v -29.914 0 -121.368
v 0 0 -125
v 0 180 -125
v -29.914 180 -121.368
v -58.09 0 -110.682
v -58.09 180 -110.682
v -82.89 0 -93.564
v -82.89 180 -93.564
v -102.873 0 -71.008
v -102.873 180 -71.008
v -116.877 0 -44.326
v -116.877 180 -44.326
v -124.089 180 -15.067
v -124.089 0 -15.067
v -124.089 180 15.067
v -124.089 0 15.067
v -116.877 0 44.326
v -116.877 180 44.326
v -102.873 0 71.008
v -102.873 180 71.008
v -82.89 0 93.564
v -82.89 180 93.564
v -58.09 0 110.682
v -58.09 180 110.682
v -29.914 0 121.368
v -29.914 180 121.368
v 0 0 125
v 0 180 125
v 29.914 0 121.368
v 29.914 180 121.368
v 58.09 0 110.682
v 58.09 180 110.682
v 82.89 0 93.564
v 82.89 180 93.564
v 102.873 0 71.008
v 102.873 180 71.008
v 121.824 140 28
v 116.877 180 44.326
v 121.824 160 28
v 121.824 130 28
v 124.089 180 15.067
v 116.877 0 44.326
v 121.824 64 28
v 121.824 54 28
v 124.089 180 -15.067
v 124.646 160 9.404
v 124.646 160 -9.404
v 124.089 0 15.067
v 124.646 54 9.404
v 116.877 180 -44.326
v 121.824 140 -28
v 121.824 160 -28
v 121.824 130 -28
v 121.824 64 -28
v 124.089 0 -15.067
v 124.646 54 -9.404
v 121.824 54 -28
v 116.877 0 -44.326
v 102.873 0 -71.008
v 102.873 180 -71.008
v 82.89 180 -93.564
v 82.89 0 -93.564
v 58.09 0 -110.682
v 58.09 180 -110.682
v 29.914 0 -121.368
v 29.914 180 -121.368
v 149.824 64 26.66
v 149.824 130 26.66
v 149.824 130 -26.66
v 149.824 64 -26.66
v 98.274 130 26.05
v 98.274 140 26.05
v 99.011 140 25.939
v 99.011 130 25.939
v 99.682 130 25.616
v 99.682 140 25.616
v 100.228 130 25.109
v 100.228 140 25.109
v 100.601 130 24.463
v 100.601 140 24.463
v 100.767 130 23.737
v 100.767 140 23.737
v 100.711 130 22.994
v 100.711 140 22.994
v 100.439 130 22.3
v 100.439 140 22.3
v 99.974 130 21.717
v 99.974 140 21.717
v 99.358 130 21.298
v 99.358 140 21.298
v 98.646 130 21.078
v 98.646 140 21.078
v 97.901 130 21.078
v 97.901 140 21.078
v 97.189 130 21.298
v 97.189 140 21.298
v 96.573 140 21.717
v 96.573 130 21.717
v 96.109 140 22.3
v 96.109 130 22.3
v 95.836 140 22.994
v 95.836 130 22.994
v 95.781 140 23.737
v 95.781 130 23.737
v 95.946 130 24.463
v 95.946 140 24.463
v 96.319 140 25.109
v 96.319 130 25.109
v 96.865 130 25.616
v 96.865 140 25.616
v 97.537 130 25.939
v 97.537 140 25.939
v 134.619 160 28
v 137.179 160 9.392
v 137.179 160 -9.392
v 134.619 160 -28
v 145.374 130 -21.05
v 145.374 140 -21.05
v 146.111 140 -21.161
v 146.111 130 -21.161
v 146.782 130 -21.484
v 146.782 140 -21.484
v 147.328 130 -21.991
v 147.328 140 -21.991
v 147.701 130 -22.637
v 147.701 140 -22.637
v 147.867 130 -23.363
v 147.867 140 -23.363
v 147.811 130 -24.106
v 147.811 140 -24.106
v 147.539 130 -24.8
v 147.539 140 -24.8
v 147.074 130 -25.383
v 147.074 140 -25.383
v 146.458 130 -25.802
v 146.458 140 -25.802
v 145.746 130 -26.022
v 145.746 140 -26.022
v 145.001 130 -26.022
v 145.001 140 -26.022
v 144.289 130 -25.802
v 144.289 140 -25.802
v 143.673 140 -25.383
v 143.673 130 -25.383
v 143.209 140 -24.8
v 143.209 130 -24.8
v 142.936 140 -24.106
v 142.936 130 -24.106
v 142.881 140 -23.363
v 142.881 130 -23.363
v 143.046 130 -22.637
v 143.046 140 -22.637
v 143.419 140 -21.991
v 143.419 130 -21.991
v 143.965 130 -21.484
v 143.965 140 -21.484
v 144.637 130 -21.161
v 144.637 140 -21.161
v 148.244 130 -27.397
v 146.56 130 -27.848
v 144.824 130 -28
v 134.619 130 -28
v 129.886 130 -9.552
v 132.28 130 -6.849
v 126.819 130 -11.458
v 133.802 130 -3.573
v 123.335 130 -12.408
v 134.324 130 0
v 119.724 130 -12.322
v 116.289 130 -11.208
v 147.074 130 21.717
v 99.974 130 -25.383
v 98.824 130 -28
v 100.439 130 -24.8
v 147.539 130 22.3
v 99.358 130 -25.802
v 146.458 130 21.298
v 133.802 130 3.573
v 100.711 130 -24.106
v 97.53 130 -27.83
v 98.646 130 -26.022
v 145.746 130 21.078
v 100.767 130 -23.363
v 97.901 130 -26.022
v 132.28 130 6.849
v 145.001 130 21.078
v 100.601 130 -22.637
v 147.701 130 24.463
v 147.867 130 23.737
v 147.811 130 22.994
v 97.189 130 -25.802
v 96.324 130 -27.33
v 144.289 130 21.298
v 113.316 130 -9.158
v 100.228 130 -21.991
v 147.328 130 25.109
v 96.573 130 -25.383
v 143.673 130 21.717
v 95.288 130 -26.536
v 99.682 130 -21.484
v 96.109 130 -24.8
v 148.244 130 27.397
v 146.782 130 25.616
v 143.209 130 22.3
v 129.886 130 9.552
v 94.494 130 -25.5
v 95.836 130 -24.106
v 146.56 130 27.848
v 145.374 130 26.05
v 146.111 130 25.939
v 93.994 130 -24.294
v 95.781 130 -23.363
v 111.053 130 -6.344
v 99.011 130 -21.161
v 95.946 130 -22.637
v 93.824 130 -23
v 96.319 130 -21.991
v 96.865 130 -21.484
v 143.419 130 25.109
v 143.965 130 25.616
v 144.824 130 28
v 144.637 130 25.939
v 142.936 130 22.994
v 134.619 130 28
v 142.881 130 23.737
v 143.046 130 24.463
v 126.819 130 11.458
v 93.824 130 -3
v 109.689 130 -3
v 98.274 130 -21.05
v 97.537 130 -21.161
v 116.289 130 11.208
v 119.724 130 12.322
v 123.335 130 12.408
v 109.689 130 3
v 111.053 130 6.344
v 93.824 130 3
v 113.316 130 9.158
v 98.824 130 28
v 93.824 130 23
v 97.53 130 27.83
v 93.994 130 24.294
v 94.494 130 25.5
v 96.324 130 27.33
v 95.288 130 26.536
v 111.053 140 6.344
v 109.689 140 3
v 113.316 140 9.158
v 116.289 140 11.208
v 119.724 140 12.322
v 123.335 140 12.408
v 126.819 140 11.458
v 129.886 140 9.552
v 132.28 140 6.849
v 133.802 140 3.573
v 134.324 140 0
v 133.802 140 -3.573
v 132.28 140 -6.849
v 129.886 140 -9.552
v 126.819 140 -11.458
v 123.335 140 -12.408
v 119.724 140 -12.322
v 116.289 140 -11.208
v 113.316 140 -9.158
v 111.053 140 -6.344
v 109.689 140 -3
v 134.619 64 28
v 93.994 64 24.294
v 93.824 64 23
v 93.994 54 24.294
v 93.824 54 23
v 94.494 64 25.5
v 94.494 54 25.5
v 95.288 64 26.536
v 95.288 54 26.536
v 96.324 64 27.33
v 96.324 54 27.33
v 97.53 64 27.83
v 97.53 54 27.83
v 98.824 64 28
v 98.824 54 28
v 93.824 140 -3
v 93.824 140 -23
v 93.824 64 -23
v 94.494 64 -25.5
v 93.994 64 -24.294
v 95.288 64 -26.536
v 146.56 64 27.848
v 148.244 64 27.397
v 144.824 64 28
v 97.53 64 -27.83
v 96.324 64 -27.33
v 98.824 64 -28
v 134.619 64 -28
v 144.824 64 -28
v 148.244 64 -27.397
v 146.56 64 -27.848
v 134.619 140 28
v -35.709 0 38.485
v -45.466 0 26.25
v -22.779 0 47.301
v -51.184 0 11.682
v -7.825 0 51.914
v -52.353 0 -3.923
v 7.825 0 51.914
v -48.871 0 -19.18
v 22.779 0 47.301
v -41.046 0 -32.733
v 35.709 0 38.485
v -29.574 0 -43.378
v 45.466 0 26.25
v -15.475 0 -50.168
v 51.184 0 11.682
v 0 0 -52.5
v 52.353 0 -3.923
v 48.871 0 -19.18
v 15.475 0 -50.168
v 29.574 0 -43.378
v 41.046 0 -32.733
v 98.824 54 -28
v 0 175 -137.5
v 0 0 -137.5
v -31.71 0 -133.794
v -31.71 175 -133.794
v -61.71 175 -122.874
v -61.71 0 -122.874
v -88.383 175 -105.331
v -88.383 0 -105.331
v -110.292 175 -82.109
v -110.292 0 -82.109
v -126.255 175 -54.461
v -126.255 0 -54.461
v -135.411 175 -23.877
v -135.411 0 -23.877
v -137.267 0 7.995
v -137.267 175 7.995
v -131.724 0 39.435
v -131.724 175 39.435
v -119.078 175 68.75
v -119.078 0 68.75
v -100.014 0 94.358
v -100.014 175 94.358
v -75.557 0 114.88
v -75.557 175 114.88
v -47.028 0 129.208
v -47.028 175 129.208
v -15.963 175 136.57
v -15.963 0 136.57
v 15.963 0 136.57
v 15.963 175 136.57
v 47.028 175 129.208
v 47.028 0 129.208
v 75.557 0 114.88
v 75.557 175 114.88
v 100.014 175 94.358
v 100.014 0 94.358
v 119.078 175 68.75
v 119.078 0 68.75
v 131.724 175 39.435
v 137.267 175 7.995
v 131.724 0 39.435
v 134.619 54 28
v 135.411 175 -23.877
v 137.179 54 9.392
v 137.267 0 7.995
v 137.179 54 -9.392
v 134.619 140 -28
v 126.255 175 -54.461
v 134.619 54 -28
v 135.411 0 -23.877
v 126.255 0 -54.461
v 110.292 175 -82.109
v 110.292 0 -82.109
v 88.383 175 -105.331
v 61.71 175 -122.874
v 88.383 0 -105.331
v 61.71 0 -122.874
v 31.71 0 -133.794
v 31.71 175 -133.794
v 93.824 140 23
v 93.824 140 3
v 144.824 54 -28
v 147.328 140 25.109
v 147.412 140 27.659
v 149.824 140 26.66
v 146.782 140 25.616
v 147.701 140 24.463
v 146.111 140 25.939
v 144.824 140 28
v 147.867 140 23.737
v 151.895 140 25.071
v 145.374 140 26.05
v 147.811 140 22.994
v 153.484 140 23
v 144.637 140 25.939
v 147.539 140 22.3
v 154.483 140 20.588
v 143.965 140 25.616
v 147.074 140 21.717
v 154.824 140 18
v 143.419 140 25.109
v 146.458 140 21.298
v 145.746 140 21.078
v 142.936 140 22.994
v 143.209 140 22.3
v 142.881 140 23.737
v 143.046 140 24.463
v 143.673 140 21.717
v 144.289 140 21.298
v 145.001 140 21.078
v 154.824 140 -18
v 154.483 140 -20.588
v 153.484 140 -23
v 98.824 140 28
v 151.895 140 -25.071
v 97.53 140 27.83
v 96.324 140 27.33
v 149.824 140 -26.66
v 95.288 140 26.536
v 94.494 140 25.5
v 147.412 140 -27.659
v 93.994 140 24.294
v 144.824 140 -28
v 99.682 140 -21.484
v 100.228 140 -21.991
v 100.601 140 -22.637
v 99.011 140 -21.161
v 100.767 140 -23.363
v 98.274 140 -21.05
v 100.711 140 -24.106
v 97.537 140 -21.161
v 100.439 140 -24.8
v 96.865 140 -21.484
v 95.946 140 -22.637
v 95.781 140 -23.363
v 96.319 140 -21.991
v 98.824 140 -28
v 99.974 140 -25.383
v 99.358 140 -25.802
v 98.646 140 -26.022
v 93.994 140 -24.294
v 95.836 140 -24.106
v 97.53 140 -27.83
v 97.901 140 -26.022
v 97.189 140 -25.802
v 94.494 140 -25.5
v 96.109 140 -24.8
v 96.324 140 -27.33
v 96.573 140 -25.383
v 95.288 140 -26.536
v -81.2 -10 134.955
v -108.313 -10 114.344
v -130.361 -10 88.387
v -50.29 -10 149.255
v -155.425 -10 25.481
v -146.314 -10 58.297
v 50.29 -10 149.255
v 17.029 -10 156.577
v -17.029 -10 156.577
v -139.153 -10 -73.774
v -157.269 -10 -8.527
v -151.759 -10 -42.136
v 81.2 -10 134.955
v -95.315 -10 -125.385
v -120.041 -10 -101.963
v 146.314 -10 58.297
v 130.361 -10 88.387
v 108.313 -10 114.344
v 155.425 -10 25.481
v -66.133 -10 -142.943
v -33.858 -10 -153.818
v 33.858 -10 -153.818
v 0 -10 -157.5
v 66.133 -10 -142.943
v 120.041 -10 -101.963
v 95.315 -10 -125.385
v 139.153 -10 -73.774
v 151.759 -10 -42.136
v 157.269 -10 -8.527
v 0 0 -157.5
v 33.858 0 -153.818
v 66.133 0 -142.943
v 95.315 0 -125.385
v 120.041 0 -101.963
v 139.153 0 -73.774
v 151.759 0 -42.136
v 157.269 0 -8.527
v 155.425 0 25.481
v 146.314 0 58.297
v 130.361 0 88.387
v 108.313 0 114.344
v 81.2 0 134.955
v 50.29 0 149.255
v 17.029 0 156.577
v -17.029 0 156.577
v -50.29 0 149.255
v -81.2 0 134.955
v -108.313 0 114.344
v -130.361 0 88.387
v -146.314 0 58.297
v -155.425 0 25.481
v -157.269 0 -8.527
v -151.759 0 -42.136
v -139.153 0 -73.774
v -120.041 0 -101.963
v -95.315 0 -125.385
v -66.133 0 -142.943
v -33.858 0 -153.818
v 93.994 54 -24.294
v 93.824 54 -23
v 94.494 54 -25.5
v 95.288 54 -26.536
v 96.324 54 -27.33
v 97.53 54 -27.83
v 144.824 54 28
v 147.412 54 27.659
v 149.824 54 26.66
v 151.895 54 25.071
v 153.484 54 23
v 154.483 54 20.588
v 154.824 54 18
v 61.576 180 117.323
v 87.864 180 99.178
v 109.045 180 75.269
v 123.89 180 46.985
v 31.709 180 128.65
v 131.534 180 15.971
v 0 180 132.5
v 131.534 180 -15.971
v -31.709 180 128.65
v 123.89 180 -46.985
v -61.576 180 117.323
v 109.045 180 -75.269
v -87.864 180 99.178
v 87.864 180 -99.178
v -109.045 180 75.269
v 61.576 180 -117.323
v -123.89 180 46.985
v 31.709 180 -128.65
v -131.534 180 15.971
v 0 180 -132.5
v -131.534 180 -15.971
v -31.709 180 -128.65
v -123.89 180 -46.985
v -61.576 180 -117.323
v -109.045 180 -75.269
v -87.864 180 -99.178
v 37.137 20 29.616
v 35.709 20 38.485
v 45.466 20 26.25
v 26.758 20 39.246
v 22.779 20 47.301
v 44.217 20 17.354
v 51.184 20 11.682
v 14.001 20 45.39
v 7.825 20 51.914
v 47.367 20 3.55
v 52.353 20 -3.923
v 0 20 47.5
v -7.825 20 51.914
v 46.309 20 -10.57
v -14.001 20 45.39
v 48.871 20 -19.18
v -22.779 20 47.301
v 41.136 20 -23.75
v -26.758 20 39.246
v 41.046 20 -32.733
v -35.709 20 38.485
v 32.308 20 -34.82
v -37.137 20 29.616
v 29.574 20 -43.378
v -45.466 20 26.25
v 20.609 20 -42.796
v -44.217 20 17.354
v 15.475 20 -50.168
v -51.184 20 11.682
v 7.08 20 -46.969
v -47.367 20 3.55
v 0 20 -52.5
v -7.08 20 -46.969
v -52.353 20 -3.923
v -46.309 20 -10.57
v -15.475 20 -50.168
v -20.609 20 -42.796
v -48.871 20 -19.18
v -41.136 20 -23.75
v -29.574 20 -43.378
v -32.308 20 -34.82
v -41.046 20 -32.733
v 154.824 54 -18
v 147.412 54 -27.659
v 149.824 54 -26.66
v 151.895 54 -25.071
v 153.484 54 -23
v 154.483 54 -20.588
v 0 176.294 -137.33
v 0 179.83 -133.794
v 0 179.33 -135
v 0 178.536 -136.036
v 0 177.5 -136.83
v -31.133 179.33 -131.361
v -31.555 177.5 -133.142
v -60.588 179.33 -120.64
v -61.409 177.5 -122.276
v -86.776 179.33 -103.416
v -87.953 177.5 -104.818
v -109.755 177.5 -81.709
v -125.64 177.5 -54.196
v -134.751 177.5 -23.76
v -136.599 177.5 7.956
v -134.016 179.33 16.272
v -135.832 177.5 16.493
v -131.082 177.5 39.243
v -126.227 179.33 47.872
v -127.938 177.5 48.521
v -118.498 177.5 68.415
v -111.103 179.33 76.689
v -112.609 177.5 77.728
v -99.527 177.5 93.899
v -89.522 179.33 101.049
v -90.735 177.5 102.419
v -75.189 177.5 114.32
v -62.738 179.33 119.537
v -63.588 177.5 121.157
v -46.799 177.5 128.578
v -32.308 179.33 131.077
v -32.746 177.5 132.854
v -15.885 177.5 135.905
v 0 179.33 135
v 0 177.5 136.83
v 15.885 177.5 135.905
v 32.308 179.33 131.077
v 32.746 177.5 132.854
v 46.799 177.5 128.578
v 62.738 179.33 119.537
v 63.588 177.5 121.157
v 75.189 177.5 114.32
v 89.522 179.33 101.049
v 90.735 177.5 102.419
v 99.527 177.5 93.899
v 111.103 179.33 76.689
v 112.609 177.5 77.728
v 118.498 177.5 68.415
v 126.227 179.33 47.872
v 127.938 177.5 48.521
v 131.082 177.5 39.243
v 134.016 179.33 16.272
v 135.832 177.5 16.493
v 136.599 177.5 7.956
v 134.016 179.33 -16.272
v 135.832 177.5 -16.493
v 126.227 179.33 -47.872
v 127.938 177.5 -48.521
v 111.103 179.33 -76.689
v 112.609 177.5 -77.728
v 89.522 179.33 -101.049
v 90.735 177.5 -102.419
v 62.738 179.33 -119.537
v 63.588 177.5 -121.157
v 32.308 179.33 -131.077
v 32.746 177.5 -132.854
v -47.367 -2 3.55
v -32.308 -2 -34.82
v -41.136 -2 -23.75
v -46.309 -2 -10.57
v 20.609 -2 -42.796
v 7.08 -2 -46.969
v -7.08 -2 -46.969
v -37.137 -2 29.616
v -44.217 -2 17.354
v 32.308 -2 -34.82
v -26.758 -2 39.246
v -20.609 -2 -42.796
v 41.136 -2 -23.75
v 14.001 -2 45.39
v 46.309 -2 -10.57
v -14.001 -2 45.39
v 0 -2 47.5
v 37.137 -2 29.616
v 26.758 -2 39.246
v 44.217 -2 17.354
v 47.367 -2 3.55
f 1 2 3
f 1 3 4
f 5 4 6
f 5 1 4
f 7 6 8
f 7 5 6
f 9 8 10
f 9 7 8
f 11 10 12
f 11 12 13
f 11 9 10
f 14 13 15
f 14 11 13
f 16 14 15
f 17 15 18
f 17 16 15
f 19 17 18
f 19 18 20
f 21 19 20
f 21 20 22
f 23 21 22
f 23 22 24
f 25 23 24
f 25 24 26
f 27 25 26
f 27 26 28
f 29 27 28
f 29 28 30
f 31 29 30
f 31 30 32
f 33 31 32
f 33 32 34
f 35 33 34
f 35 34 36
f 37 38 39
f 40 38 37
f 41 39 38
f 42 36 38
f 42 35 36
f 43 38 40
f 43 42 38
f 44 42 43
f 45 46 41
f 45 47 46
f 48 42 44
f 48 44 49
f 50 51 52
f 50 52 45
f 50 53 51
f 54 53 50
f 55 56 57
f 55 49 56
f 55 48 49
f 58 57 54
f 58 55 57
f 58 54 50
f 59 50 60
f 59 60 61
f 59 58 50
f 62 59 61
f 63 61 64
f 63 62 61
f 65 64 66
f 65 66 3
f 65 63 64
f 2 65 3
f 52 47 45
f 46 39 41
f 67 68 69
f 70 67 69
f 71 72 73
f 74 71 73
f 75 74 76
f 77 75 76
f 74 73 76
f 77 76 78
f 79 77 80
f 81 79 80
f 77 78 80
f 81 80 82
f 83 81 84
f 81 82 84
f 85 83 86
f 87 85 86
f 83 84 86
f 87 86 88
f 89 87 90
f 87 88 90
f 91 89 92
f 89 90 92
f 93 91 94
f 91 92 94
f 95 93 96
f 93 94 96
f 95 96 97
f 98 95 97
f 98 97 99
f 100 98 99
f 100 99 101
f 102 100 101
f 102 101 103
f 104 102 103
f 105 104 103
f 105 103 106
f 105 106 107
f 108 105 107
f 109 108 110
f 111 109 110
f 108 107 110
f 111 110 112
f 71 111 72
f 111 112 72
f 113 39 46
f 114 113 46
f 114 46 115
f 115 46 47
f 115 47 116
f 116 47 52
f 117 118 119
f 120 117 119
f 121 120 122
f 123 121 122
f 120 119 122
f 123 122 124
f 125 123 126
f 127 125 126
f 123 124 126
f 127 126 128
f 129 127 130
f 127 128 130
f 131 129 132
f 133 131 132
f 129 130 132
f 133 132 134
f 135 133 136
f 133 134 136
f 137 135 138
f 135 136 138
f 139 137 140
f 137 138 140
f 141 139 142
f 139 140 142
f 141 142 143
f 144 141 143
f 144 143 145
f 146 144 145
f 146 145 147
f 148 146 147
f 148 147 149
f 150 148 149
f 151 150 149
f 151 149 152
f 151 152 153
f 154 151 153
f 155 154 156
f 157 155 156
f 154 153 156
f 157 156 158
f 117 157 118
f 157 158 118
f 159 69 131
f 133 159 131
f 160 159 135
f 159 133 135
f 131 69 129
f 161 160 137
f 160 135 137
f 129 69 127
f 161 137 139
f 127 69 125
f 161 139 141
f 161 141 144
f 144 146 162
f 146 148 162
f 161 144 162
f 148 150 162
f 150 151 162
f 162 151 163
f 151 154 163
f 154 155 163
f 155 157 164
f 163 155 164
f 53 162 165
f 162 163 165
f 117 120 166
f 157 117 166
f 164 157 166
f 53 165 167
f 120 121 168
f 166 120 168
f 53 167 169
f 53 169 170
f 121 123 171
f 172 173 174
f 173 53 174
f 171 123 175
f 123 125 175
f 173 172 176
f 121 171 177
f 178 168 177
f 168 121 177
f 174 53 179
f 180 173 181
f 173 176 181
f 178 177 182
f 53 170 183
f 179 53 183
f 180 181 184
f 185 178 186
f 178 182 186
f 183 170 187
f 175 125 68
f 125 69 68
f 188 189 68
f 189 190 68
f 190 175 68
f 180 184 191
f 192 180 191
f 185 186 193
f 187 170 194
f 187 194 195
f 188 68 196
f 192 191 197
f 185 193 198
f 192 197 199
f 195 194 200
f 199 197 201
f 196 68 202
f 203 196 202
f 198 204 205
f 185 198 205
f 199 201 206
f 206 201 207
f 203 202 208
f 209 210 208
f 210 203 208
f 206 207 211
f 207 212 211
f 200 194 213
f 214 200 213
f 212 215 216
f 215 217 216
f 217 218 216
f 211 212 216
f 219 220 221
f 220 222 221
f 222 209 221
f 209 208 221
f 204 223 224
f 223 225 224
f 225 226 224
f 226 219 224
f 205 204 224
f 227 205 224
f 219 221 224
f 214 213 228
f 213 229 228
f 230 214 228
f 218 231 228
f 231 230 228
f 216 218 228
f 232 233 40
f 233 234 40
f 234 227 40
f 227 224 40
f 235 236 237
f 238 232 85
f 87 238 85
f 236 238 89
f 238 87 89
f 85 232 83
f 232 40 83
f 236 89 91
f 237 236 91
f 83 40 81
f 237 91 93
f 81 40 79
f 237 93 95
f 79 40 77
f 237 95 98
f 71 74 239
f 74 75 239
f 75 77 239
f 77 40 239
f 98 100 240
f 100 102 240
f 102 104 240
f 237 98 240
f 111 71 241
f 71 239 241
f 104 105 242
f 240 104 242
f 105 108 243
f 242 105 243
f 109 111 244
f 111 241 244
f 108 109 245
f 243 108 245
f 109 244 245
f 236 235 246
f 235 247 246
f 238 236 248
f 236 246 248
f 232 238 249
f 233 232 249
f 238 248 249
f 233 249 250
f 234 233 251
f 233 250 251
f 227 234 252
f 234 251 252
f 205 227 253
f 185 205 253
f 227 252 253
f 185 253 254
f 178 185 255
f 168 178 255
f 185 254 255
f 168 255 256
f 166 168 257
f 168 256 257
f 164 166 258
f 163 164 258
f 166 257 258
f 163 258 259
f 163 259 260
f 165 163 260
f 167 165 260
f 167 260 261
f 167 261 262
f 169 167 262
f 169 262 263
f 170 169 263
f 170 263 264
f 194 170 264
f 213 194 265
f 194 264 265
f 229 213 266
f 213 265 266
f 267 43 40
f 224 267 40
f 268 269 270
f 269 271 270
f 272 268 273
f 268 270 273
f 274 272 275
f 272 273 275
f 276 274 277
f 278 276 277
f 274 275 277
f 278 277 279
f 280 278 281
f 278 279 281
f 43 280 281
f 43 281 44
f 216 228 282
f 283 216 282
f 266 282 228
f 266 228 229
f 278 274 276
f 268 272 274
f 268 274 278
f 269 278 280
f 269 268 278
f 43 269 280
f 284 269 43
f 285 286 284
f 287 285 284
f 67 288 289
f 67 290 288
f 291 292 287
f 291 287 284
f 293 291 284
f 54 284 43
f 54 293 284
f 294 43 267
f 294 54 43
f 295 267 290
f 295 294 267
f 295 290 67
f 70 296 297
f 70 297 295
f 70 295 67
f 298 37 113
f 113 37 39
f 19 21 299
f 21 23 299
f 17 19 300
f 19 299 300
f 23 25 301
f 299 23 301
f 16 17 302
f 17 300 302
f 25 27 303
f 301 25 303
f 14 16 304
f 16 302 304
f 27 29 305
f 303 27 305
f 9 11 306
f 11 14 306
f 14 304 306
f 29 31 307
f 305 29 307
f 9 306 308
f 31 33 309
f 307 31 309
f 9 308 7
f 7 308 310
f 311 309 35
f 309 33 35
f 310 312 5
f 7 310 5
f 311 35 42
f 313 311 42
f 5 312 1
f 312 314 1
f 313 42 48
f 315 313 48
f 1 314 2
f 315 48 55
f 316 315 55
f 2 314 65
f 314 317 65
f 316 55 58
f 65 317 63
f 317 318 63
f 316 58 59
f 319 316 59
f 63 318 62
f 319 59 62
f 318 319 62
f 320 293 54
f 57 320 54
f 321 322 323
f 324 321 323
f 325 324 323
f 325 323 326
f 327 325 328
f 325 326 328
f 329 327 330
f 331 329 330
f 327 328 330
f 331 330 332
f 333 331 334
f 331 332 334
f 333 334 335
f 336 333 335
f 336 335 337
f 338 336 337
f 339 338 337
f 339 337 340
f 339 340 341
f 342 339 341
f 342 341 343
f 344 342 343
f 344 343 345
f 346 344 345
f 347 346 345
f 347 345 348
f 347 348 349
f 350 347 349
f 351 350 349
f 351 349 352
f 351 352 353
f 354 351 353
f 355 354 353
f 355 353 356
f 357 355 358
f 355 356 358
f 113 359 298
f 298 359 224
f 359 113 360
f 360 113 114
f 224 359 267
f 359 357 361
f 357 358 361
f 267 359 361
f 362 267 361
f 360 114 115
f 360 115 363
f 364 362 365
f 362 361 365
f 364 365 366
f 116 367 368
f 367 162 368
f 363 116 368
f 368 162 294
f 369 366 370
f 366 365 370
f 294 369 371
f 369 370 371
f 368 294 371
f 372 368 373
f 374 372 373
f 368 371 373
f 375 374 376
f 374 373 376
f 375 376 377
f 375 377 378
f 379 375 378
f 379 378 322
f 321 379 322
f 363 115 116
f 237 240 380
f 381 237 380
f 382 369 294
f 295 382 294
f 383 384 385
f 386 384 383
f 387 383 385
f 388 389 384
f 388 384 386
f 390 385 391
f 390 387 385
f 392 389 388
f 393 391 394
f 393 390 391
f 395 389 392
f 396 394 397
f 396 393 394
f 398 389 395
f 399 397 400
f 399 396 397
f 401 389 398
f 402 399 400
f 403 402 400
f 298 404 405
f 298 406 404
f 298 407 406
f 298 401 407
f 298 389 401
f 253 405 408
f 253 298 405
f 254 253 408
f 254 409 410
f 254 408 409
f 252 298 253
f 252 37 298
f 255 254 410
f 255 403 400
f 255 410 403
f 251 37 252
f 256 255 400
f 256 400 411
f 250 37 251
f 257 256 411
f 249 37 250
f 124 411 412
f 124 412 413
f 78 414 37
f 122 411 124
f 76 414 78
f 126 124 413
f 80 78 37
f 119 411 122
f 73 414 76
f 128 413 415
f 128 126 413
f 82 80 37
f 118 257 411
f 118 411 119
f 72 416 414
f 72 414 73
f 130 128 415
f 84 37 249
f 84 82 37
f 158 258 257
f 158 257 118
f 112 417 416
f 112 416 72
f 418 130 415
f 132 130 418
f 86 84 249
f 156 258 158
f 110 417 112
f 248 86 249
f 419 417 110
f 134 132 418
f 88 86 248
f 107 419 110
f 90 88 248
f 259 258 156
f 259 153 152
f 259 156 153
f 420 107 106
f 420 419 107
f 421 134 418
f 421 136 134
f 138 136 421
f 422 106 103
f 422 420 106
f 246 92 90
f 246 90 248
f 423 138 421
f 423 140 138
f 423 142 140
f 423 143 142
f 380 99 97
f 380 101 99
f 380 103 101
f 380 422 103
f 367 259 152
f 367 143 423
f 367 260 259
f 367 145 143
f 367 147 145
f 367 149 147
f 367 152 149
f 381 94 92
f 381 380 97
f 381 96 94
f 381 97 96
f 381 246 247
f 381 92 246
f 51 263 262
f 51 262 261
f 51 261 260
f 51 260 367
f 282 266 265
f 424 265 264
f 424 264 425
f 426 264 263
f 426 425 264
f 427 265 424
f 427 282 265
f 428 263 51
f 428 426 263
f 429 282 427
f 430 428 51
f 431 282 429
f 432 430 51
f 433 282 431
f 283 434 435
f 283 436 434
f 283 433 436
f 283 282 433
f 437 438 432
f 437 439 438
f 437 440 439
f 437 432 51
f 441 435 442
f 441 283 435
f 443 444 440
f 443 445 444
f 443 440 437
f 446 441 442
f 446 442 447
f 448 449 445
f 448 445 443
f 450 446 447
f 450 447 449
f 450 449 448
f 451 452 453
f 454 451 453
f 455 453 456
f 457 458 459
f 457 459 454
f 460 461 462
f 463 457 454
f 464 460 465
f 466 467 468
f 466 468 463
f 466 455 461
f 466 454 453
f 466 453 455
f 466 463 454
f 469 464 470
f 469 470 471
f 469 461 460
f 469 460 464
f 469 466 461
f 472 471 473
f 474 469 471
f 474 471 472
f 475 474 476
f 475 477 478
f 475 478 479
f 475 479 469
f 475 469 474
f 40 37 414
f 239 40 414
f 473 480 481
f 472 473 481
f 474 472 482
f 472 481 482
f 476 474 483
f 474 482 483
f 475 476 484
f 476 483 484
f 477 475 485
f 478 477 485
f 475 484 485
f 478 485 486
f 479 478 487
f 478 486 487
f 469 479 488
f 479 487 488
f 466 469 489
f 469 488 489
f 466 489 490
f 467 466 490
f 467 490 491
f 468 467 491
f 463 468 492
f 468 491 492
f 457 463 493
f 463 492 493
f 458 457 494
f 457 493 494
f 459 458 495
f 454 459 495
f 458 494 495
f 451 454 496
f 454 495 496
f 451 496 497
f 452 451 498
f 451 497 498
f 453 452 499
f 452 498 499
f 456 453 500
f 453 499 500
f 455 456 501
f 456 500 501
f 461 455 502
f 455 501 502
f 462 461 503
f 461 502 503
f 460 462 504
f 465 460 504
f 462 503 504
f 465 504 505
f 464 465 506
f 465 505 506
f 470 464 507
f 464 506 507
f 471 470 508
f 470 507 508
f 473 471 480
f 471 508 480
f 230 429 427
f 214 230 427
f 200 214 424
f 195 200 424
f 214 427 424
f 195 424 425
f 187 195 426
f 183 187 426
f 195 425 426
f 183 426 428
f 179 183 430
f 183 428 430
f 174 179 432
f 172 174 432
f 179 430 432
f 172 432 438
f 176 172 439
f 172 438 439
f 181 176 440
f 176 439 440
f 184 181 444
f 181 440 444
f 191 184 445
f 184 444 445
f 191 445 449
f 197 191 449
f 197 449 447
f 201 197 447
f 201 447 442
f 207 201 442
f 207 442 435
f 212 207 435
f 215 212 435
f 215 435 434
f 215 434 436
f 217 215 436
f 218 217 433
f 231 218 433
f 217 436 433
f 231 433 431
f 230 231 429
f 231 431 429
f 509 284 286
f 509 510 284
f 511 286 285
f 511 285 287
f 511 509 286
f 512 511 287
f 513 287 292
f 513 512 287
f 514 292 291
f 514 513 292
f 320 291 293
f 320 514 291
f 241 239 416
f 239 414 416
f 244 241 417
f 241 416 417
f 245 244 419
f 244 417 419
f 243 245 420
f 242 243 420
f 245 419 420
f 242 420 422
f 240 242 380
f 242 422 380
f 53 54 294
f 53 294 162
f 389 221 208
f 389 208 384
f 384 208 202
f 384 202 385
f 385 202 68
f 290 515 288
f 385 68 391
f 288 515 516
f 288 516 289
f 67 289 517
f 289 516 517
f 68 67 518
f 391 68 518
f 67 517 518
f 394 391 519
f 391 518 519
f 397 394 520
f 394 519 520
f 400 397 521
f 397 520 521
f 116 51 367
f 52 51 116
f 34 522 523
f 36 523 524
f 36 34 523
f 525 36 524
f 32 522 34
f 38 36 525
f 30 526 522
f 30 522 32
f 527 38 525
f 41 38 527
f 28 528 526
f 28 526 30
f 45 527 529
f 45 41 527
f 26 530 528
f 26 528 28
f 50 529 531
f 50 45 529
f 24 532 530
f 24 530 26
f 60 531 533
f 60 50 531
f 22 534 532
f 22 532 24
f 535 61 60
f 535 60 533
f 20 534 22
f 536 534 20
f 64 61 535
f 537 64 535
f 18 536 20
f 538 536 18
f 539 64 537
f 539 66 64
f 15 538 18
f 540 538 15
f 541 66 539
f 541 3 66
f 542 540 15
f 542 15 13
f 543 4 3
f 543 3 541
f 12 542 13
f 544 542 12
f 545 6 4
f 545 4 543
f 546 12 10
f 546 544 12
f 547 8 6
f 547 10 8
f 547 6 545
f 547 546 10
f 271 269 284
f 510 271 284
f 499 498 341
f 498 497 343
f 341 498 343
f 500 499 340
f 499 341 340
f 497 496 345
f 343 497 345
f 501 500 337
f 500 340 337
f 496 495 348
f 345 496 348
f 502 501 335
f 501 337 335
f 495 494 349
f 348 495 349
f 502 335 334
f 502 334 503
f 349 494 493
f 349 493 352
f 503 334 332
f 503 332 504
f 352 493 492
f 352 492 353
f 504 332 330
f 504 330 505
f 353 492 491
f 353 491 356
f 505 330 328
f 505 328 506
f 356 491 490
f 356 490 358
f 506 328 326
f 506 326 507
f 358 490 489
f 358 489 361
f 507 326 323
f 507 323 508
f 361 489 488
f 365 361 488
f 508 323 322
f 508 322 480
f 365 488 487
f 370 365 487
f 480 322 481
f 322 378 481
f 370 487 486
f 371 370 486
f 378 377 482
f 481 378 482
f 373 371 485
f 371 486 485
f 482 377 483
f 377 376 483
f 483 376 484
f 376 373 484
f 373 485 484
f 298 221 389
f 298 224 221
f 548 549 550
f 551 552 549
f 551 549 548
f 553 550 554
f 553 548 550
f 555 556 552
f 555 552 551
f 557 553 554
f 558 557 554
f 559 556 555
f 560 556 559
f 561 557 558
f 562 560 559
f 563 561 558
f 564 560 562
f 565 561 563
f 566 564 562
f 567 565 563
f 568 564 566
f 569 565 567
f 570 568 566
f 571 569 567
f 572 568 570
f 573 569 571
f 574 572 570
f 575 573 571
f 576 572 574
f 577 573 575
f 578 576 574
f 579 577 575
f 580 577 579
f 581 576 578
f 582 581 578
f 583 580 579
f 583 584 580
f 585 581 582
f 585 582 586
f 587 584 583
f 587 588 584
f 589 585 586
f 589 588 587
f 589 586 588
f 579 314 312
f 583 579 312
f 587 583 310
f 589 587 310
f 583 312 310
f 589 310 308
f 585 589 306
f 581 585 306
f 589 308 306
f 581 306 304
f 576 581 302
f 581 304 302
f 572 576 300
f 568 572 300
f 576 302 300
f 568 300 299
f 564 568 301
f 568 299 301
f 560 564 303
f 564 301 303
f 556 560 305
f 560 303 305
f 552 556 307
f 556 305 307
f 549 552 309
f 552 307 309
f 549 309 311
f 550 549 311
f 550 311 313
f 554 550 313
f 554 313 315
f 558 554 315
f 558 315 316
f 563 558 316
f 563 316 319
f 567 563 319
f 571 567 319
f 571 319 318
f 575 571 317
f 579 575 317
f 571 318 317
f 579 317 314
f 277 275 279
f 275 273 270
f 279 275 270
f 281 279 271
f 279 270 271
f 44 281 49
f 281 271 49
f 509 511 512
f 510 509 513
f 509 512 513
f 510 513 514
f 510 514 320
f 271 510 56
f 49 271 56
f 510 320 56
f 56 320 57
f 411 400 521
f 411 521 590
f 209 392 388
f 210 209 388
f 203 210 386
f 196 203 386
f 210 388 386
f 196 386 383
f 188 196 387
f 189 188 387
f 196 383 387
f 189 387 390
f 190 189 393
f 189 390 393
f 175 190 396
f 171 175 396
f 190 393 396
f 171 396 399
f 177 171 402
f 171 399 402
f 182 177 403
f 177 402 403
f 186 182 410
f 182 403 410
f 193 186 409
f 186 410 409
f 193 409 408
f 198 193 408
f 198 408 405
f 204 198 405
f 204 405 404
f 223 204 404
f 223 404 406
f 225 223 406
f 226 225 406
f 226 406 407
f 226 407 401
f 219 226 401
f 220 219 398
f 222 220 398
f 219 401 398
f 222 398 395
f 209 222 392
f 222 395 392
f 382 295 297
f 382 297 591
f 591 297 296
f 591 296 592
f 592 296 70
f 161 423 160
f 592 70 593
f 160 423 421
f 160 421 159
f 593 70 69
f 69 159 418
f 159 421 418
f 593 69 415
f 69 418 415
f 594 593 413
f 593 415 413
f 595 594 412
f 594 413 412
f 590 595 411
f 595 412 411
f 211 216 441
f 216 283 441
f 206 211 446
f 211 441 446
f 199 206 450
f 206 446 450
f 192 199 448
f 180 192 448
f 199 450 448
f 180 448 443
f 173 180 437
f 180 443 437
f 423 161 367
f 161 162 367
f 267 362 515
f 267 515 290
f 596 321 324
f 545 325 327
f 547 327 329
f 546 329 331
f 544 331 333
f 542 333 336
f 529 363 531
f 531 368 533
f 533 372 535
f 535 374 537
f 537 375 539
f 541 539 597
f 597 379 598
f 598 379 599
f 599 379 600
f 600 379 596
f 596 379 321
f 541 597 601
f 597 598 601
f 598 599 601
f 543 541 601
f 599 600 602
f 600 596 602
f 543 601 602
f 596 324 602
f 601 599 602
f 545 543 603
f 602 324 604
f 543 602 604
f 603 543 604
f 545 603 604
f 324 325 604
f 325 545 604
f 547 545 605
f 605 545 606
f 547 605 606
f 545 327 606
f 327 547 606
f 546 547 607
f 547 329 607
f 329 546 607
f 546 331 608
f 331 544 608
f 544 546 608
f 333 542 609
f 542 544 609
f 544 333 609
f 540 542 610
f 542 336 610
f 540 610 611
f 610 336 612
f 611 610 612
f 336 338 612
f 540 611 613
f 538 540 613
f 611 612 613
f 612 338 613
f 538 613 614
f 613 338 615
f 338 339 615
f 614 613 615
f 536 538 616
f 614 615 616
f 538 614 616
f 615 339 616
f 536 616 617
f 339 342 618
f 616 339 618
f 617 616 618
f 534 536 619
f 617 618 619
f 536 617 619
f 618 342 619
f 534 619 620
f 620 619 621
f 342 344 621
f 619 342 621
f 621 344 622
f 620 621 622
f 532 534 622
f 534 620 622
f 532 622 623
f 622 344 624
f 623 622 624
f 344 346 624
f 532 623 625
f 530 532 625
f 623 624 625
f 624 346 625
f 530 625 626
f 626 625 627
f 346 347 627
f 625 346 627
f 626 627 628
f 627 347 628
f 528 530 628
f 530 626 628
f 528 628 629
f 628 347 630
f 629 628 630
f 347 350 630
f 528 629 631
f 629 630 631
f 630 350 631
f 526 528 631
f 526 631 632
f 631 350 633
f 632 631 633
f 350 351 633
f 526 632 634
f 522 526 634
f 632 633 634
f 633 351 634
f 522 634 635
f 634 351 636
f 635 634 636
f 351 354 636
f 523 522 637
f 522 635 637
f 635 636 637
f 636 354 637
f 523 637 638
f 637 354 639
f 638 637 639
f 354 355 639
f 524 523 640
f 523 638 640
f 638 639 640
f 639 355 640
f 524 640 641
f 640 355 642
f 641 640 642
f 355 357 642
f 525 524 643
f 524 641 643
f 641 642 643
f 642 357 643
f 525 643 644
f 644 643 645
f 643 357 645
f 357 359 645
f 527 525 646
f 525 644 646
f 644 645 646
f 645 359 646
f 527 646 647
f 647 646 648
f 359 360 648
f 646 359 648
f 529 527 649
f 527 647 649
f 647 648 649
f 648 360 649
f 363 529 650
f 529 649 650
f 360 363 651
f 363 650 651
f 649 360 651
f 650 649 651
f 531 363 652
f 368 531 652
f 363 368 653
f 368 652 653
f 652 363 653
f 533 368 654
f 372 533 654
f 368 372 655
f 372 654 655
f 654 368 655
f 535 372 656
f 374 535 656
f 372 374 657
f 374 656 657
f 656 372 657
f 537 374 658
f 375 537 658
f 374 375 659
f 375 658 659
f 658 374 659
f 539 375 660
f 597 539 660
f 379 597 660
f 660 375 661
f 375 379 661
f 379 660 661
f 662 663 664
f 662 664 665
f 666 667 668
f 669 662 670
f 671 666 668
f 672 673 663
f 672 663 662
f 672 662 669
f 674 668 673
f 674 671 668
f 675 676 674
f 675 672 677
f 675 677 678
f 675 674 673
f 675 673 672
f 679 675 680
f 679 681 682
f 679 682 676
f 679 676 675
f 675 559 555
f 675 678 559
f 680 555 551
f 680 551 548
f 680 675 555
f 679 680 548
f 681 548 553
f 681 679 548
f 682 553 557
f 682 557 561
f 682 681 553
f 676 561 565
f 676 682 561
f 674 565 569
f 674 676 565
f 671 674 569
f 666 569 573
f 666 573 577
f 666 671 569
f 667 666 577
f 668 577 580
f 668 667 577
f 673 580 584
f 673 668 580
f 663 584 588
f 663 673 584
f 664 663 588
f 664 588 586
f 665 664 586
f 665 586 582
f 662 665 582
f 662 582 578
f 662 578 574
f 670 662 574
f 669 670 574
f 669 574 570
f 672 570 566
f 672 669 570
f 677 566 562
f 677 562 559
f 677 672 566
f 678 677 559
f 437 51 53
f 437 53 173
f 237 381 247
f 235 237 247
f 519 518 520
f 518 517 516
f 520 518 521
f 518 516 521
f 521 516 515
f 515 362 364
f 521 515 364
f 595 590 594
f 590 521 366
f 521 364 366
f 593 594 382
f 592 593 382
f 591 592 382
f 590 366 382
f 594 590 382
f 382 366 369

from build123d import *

# Parameters (mm, degrees)
SKETCH1_R           = 137.5
SKETCH1_R_2         = 125
BOSS_EXTRUDE1_DEPTH = 180
SKETCH2_R           = 157.5
BOSS_EXTRUDE2_DEPTH = 10
SKETCH3_R           = 52.5
SKETCH3_R_2         = 47.5
BOSS_EXTRUDE3_DEPTH = 20
SKETCH4_W           = 56
SKETCH4_H           = 96
CUT_EXTRUDE4_DEPTH  = 150
SKETCH5_W           = 56
SKETCH5_H           = 10
BOSS_EXTRUDE4_DEPTH = 56
SKETCH6_W           = 56
SKETCH6_H           = 56
BOSS_EXTRUDE5_DEPTH = 10
SKETCH7_R           = 2.5
SKETCH7_R_2         = 12.5
CUT_EXTRUDE5_DEPTH  = 10
SKETCH8_W           = 56
SKETCH8_H           = 86
BOSS_EXTRUDE6_DEPTH = 5
FILLET1_R           = 10
FILLET2_R           = 5
SKETCH9_W           = 31.730677801
SKETCH9_H           = 6
CUT_EXTRUDE6_DEPTH  = 10
FILLET3_R           = 5
CUT_EXTRUDE7_START  = -2
SKETCH10_R          = 47.5
CUT_EXTRUDE7_DEPTH  = 2


with BuildPart() as part:
    # Sketch1 → Boss-Extrude1 (new body)
    with BuildSketch(Plane(origin=(0, 0, 0), x_dir=(1, 0, 0), z_dir=(0, 1, 0))):
        with Locations(Location((0, 0, 0), (0, 0, 90))):
            Circle(SKETCH1_R)
        with Locations(Location((0, 0, 0), (0, 0, 90))):
            Circle(SKETCH1_R_2, mode=Mode.SUBTRACT)
    extrude(amount=BOSS_EXTRUDE1_DEPTH)

    # Sketch2 → Boss-Extrude2 (add)
    with BuildSketch(Plane.XZ):
        with Locations(Location((0, 0, 0), (0, 0, 270))):
            Circle(SKETCH2_R)
    extrude(amount=BOSS_EXTRUDE2_DEPTH)

    # Sketch3 → Boss-Extrude3 (add)
    with BuildSketch(Plane(origin=(0, 0, 0), x_dir=(1, 0, 0), z_dir=(0, 1, 0))):
        with Locations(Location((0, 0, 0), (0, 0, 90))):
            Circle(SKETCH3_R)
        with Locations(Location((0, 0, 0), (0, 0, 270))):
            Circle(SKETCH3_R_2, mode=Mode.SUBTRACT)
    extrude(amount=BOSS_EXTRUDE3_DEPTH)

    # Sketch4 → Cut-Extrude4 (cut)
    with BuildSketch(Plane(origin=(0, 0, 0), x_dir=(0, 0, -1), z_dir=(1, 0, 0))):
        with Locations((0, 112)):
            Rectangle(SKETCH4_W, SKETCH4_H)
    extrude(amount=CUT_EXTRUDE4_DEPTH, mode=Mode.SUBTRACT)

    # Sketch5 → Boss-Extrude4 (add)
    with BuildSketch(Plane(origin=(0, 0, 28), x_dir=(-1, 0, 0), z_dir=(0, 0, -1))):
        with Locations((-121.823643025, 135)):
            Rectangle(SKETCH5_W, SKETCH5_H)
    extrude(amount=BOSS_EXTRUDE4_DEPTH)

    # Sketch6 → Boss-Extrude5 (add)
    with BuildSketch(Plane(origin=(0, 64, 0), x_dir=(1, 0, 0), z_dir=(0, 1, 0))):
        with Locations((121.823643025, 0)):
            Rectangle(SKETCH6_W, SKETCH6_H)
    extrude(amount=-BOSS_EXTRUDE5_DEPTH)

    # Sketch7 → Cut-Extrude5 (cut)
    with BuildSketch(Plane(origin=(0, 140, 0), x_dir=(1, 0, 0), z_dir=(0, 1, 0))):
        with Locations(Location((98.273643025, 23.55, 0), (0, 0, 270))):
            Circle(SKETCH7_R)
        with Locations(Location((145.373643025, 23.55, 0), (0, 0, 270))):
            Circle(SKETCH7_R)
        with Locations(Location((98.273643025, -23.55, 0), (0, 0, 270))):
            Circle(SKETCH7_R)
        with Locations(Location((145.373643025, -23.55, 0), (0, 0, 270))):
            Circle(SKETCH7_R)
        with Locations(Location((121.823643025, 0, 0), (0, 0, 270))):
            Circle(SKETCH7_R_2)
    extrude(amount=-CUT_EXTRUDE5_DEPTH, mode=Mode.SUBTRACT)

    # Sketch8 → Boss-Extrude6 (add)
    with BuildSketch(Plane(origin=(149.823643025, 0, 0), x_dir=(0, 0, -1), z_dir=(1, 0, 0))):
        with Locations((0, 97)):
            Rectangle(SKETCH8_W, SKETCH8_H)
    extrude(amount=BOSS_EXTRUDE6_DEPTH)

    # Fillet1
    # the kernel refuses this fillet: 10 mm, written as the material it takes off along each edge
    with BuildSketch(Plane(origin=(154.823643025, 165, -28), x_dir=(0, 0, 1), z_dir=(0, -1, 0)), Plane(origin=(154.823643025, 29, 28), x_dir=(0, 0, -1), z_dir=(0, 1, 0))) as fillet1_piece_1:
        with BuildLine():
            CenterArc((FILLET1_R, FILLET1_R), FILLET1_R, 180, 90)
            Line((0, FILLET1_R), (0, 0))
            Line((0, 0), (FILLET1_R, 0))
        make_face()
    extrude(amount=136, mode=Mode.SUBTRACT)

    # Fillet2
    fillet2_edges = [part.edges().sort_by_distance(p)[0] for p in [
        (93.823643025, 135, -28),
        (93.823643025, 135, 28),
        (93.823643025, 59, 28),
        (93.823643025, 59, -28),
    ]]
    fillet(fillet2_edges, radius=FILLET2_R)

    # Sketch9 → Cut-Extrude6 (cut)
    with BuildSketch(Plane(origin=(0, 140, 0), x_dir=(1, 0, 0), z_dir=(0, 1, 0))):
        with Locations((93.823643026, 0)):
            Rectangle(SKETCH9_W, SKETCH9_H)
    extrude(amount=-CUT_EXTRUDE6_DEPTH, mode=Mode.SUBTRACT)

    # Fillet3
    fillet3_edges = [part.edges().sort_by_distance(p)[0] for p in [
        (0, 180, 137.5),
    ]]
    fillet(fillet3_edges, radius=FILLET3_R)

    # Sketch10 → Cut-Extrude7 (cut)
    with BuildSketch(Plane(origin=(0, 0, 0), x_dir=(1, 0, 0), z_dir=(0, 1, 0)).offset(CUT_EXTRUDE7_START)):
        with Locations(Location((0, 0, 0), (0, 0, 270))):
            Circle(SKETCH10_R)
    extrude(amount=CUT_EXTRUDE7_DEPTH, mode=Mode.SUBTRACT)


solid = part.part
